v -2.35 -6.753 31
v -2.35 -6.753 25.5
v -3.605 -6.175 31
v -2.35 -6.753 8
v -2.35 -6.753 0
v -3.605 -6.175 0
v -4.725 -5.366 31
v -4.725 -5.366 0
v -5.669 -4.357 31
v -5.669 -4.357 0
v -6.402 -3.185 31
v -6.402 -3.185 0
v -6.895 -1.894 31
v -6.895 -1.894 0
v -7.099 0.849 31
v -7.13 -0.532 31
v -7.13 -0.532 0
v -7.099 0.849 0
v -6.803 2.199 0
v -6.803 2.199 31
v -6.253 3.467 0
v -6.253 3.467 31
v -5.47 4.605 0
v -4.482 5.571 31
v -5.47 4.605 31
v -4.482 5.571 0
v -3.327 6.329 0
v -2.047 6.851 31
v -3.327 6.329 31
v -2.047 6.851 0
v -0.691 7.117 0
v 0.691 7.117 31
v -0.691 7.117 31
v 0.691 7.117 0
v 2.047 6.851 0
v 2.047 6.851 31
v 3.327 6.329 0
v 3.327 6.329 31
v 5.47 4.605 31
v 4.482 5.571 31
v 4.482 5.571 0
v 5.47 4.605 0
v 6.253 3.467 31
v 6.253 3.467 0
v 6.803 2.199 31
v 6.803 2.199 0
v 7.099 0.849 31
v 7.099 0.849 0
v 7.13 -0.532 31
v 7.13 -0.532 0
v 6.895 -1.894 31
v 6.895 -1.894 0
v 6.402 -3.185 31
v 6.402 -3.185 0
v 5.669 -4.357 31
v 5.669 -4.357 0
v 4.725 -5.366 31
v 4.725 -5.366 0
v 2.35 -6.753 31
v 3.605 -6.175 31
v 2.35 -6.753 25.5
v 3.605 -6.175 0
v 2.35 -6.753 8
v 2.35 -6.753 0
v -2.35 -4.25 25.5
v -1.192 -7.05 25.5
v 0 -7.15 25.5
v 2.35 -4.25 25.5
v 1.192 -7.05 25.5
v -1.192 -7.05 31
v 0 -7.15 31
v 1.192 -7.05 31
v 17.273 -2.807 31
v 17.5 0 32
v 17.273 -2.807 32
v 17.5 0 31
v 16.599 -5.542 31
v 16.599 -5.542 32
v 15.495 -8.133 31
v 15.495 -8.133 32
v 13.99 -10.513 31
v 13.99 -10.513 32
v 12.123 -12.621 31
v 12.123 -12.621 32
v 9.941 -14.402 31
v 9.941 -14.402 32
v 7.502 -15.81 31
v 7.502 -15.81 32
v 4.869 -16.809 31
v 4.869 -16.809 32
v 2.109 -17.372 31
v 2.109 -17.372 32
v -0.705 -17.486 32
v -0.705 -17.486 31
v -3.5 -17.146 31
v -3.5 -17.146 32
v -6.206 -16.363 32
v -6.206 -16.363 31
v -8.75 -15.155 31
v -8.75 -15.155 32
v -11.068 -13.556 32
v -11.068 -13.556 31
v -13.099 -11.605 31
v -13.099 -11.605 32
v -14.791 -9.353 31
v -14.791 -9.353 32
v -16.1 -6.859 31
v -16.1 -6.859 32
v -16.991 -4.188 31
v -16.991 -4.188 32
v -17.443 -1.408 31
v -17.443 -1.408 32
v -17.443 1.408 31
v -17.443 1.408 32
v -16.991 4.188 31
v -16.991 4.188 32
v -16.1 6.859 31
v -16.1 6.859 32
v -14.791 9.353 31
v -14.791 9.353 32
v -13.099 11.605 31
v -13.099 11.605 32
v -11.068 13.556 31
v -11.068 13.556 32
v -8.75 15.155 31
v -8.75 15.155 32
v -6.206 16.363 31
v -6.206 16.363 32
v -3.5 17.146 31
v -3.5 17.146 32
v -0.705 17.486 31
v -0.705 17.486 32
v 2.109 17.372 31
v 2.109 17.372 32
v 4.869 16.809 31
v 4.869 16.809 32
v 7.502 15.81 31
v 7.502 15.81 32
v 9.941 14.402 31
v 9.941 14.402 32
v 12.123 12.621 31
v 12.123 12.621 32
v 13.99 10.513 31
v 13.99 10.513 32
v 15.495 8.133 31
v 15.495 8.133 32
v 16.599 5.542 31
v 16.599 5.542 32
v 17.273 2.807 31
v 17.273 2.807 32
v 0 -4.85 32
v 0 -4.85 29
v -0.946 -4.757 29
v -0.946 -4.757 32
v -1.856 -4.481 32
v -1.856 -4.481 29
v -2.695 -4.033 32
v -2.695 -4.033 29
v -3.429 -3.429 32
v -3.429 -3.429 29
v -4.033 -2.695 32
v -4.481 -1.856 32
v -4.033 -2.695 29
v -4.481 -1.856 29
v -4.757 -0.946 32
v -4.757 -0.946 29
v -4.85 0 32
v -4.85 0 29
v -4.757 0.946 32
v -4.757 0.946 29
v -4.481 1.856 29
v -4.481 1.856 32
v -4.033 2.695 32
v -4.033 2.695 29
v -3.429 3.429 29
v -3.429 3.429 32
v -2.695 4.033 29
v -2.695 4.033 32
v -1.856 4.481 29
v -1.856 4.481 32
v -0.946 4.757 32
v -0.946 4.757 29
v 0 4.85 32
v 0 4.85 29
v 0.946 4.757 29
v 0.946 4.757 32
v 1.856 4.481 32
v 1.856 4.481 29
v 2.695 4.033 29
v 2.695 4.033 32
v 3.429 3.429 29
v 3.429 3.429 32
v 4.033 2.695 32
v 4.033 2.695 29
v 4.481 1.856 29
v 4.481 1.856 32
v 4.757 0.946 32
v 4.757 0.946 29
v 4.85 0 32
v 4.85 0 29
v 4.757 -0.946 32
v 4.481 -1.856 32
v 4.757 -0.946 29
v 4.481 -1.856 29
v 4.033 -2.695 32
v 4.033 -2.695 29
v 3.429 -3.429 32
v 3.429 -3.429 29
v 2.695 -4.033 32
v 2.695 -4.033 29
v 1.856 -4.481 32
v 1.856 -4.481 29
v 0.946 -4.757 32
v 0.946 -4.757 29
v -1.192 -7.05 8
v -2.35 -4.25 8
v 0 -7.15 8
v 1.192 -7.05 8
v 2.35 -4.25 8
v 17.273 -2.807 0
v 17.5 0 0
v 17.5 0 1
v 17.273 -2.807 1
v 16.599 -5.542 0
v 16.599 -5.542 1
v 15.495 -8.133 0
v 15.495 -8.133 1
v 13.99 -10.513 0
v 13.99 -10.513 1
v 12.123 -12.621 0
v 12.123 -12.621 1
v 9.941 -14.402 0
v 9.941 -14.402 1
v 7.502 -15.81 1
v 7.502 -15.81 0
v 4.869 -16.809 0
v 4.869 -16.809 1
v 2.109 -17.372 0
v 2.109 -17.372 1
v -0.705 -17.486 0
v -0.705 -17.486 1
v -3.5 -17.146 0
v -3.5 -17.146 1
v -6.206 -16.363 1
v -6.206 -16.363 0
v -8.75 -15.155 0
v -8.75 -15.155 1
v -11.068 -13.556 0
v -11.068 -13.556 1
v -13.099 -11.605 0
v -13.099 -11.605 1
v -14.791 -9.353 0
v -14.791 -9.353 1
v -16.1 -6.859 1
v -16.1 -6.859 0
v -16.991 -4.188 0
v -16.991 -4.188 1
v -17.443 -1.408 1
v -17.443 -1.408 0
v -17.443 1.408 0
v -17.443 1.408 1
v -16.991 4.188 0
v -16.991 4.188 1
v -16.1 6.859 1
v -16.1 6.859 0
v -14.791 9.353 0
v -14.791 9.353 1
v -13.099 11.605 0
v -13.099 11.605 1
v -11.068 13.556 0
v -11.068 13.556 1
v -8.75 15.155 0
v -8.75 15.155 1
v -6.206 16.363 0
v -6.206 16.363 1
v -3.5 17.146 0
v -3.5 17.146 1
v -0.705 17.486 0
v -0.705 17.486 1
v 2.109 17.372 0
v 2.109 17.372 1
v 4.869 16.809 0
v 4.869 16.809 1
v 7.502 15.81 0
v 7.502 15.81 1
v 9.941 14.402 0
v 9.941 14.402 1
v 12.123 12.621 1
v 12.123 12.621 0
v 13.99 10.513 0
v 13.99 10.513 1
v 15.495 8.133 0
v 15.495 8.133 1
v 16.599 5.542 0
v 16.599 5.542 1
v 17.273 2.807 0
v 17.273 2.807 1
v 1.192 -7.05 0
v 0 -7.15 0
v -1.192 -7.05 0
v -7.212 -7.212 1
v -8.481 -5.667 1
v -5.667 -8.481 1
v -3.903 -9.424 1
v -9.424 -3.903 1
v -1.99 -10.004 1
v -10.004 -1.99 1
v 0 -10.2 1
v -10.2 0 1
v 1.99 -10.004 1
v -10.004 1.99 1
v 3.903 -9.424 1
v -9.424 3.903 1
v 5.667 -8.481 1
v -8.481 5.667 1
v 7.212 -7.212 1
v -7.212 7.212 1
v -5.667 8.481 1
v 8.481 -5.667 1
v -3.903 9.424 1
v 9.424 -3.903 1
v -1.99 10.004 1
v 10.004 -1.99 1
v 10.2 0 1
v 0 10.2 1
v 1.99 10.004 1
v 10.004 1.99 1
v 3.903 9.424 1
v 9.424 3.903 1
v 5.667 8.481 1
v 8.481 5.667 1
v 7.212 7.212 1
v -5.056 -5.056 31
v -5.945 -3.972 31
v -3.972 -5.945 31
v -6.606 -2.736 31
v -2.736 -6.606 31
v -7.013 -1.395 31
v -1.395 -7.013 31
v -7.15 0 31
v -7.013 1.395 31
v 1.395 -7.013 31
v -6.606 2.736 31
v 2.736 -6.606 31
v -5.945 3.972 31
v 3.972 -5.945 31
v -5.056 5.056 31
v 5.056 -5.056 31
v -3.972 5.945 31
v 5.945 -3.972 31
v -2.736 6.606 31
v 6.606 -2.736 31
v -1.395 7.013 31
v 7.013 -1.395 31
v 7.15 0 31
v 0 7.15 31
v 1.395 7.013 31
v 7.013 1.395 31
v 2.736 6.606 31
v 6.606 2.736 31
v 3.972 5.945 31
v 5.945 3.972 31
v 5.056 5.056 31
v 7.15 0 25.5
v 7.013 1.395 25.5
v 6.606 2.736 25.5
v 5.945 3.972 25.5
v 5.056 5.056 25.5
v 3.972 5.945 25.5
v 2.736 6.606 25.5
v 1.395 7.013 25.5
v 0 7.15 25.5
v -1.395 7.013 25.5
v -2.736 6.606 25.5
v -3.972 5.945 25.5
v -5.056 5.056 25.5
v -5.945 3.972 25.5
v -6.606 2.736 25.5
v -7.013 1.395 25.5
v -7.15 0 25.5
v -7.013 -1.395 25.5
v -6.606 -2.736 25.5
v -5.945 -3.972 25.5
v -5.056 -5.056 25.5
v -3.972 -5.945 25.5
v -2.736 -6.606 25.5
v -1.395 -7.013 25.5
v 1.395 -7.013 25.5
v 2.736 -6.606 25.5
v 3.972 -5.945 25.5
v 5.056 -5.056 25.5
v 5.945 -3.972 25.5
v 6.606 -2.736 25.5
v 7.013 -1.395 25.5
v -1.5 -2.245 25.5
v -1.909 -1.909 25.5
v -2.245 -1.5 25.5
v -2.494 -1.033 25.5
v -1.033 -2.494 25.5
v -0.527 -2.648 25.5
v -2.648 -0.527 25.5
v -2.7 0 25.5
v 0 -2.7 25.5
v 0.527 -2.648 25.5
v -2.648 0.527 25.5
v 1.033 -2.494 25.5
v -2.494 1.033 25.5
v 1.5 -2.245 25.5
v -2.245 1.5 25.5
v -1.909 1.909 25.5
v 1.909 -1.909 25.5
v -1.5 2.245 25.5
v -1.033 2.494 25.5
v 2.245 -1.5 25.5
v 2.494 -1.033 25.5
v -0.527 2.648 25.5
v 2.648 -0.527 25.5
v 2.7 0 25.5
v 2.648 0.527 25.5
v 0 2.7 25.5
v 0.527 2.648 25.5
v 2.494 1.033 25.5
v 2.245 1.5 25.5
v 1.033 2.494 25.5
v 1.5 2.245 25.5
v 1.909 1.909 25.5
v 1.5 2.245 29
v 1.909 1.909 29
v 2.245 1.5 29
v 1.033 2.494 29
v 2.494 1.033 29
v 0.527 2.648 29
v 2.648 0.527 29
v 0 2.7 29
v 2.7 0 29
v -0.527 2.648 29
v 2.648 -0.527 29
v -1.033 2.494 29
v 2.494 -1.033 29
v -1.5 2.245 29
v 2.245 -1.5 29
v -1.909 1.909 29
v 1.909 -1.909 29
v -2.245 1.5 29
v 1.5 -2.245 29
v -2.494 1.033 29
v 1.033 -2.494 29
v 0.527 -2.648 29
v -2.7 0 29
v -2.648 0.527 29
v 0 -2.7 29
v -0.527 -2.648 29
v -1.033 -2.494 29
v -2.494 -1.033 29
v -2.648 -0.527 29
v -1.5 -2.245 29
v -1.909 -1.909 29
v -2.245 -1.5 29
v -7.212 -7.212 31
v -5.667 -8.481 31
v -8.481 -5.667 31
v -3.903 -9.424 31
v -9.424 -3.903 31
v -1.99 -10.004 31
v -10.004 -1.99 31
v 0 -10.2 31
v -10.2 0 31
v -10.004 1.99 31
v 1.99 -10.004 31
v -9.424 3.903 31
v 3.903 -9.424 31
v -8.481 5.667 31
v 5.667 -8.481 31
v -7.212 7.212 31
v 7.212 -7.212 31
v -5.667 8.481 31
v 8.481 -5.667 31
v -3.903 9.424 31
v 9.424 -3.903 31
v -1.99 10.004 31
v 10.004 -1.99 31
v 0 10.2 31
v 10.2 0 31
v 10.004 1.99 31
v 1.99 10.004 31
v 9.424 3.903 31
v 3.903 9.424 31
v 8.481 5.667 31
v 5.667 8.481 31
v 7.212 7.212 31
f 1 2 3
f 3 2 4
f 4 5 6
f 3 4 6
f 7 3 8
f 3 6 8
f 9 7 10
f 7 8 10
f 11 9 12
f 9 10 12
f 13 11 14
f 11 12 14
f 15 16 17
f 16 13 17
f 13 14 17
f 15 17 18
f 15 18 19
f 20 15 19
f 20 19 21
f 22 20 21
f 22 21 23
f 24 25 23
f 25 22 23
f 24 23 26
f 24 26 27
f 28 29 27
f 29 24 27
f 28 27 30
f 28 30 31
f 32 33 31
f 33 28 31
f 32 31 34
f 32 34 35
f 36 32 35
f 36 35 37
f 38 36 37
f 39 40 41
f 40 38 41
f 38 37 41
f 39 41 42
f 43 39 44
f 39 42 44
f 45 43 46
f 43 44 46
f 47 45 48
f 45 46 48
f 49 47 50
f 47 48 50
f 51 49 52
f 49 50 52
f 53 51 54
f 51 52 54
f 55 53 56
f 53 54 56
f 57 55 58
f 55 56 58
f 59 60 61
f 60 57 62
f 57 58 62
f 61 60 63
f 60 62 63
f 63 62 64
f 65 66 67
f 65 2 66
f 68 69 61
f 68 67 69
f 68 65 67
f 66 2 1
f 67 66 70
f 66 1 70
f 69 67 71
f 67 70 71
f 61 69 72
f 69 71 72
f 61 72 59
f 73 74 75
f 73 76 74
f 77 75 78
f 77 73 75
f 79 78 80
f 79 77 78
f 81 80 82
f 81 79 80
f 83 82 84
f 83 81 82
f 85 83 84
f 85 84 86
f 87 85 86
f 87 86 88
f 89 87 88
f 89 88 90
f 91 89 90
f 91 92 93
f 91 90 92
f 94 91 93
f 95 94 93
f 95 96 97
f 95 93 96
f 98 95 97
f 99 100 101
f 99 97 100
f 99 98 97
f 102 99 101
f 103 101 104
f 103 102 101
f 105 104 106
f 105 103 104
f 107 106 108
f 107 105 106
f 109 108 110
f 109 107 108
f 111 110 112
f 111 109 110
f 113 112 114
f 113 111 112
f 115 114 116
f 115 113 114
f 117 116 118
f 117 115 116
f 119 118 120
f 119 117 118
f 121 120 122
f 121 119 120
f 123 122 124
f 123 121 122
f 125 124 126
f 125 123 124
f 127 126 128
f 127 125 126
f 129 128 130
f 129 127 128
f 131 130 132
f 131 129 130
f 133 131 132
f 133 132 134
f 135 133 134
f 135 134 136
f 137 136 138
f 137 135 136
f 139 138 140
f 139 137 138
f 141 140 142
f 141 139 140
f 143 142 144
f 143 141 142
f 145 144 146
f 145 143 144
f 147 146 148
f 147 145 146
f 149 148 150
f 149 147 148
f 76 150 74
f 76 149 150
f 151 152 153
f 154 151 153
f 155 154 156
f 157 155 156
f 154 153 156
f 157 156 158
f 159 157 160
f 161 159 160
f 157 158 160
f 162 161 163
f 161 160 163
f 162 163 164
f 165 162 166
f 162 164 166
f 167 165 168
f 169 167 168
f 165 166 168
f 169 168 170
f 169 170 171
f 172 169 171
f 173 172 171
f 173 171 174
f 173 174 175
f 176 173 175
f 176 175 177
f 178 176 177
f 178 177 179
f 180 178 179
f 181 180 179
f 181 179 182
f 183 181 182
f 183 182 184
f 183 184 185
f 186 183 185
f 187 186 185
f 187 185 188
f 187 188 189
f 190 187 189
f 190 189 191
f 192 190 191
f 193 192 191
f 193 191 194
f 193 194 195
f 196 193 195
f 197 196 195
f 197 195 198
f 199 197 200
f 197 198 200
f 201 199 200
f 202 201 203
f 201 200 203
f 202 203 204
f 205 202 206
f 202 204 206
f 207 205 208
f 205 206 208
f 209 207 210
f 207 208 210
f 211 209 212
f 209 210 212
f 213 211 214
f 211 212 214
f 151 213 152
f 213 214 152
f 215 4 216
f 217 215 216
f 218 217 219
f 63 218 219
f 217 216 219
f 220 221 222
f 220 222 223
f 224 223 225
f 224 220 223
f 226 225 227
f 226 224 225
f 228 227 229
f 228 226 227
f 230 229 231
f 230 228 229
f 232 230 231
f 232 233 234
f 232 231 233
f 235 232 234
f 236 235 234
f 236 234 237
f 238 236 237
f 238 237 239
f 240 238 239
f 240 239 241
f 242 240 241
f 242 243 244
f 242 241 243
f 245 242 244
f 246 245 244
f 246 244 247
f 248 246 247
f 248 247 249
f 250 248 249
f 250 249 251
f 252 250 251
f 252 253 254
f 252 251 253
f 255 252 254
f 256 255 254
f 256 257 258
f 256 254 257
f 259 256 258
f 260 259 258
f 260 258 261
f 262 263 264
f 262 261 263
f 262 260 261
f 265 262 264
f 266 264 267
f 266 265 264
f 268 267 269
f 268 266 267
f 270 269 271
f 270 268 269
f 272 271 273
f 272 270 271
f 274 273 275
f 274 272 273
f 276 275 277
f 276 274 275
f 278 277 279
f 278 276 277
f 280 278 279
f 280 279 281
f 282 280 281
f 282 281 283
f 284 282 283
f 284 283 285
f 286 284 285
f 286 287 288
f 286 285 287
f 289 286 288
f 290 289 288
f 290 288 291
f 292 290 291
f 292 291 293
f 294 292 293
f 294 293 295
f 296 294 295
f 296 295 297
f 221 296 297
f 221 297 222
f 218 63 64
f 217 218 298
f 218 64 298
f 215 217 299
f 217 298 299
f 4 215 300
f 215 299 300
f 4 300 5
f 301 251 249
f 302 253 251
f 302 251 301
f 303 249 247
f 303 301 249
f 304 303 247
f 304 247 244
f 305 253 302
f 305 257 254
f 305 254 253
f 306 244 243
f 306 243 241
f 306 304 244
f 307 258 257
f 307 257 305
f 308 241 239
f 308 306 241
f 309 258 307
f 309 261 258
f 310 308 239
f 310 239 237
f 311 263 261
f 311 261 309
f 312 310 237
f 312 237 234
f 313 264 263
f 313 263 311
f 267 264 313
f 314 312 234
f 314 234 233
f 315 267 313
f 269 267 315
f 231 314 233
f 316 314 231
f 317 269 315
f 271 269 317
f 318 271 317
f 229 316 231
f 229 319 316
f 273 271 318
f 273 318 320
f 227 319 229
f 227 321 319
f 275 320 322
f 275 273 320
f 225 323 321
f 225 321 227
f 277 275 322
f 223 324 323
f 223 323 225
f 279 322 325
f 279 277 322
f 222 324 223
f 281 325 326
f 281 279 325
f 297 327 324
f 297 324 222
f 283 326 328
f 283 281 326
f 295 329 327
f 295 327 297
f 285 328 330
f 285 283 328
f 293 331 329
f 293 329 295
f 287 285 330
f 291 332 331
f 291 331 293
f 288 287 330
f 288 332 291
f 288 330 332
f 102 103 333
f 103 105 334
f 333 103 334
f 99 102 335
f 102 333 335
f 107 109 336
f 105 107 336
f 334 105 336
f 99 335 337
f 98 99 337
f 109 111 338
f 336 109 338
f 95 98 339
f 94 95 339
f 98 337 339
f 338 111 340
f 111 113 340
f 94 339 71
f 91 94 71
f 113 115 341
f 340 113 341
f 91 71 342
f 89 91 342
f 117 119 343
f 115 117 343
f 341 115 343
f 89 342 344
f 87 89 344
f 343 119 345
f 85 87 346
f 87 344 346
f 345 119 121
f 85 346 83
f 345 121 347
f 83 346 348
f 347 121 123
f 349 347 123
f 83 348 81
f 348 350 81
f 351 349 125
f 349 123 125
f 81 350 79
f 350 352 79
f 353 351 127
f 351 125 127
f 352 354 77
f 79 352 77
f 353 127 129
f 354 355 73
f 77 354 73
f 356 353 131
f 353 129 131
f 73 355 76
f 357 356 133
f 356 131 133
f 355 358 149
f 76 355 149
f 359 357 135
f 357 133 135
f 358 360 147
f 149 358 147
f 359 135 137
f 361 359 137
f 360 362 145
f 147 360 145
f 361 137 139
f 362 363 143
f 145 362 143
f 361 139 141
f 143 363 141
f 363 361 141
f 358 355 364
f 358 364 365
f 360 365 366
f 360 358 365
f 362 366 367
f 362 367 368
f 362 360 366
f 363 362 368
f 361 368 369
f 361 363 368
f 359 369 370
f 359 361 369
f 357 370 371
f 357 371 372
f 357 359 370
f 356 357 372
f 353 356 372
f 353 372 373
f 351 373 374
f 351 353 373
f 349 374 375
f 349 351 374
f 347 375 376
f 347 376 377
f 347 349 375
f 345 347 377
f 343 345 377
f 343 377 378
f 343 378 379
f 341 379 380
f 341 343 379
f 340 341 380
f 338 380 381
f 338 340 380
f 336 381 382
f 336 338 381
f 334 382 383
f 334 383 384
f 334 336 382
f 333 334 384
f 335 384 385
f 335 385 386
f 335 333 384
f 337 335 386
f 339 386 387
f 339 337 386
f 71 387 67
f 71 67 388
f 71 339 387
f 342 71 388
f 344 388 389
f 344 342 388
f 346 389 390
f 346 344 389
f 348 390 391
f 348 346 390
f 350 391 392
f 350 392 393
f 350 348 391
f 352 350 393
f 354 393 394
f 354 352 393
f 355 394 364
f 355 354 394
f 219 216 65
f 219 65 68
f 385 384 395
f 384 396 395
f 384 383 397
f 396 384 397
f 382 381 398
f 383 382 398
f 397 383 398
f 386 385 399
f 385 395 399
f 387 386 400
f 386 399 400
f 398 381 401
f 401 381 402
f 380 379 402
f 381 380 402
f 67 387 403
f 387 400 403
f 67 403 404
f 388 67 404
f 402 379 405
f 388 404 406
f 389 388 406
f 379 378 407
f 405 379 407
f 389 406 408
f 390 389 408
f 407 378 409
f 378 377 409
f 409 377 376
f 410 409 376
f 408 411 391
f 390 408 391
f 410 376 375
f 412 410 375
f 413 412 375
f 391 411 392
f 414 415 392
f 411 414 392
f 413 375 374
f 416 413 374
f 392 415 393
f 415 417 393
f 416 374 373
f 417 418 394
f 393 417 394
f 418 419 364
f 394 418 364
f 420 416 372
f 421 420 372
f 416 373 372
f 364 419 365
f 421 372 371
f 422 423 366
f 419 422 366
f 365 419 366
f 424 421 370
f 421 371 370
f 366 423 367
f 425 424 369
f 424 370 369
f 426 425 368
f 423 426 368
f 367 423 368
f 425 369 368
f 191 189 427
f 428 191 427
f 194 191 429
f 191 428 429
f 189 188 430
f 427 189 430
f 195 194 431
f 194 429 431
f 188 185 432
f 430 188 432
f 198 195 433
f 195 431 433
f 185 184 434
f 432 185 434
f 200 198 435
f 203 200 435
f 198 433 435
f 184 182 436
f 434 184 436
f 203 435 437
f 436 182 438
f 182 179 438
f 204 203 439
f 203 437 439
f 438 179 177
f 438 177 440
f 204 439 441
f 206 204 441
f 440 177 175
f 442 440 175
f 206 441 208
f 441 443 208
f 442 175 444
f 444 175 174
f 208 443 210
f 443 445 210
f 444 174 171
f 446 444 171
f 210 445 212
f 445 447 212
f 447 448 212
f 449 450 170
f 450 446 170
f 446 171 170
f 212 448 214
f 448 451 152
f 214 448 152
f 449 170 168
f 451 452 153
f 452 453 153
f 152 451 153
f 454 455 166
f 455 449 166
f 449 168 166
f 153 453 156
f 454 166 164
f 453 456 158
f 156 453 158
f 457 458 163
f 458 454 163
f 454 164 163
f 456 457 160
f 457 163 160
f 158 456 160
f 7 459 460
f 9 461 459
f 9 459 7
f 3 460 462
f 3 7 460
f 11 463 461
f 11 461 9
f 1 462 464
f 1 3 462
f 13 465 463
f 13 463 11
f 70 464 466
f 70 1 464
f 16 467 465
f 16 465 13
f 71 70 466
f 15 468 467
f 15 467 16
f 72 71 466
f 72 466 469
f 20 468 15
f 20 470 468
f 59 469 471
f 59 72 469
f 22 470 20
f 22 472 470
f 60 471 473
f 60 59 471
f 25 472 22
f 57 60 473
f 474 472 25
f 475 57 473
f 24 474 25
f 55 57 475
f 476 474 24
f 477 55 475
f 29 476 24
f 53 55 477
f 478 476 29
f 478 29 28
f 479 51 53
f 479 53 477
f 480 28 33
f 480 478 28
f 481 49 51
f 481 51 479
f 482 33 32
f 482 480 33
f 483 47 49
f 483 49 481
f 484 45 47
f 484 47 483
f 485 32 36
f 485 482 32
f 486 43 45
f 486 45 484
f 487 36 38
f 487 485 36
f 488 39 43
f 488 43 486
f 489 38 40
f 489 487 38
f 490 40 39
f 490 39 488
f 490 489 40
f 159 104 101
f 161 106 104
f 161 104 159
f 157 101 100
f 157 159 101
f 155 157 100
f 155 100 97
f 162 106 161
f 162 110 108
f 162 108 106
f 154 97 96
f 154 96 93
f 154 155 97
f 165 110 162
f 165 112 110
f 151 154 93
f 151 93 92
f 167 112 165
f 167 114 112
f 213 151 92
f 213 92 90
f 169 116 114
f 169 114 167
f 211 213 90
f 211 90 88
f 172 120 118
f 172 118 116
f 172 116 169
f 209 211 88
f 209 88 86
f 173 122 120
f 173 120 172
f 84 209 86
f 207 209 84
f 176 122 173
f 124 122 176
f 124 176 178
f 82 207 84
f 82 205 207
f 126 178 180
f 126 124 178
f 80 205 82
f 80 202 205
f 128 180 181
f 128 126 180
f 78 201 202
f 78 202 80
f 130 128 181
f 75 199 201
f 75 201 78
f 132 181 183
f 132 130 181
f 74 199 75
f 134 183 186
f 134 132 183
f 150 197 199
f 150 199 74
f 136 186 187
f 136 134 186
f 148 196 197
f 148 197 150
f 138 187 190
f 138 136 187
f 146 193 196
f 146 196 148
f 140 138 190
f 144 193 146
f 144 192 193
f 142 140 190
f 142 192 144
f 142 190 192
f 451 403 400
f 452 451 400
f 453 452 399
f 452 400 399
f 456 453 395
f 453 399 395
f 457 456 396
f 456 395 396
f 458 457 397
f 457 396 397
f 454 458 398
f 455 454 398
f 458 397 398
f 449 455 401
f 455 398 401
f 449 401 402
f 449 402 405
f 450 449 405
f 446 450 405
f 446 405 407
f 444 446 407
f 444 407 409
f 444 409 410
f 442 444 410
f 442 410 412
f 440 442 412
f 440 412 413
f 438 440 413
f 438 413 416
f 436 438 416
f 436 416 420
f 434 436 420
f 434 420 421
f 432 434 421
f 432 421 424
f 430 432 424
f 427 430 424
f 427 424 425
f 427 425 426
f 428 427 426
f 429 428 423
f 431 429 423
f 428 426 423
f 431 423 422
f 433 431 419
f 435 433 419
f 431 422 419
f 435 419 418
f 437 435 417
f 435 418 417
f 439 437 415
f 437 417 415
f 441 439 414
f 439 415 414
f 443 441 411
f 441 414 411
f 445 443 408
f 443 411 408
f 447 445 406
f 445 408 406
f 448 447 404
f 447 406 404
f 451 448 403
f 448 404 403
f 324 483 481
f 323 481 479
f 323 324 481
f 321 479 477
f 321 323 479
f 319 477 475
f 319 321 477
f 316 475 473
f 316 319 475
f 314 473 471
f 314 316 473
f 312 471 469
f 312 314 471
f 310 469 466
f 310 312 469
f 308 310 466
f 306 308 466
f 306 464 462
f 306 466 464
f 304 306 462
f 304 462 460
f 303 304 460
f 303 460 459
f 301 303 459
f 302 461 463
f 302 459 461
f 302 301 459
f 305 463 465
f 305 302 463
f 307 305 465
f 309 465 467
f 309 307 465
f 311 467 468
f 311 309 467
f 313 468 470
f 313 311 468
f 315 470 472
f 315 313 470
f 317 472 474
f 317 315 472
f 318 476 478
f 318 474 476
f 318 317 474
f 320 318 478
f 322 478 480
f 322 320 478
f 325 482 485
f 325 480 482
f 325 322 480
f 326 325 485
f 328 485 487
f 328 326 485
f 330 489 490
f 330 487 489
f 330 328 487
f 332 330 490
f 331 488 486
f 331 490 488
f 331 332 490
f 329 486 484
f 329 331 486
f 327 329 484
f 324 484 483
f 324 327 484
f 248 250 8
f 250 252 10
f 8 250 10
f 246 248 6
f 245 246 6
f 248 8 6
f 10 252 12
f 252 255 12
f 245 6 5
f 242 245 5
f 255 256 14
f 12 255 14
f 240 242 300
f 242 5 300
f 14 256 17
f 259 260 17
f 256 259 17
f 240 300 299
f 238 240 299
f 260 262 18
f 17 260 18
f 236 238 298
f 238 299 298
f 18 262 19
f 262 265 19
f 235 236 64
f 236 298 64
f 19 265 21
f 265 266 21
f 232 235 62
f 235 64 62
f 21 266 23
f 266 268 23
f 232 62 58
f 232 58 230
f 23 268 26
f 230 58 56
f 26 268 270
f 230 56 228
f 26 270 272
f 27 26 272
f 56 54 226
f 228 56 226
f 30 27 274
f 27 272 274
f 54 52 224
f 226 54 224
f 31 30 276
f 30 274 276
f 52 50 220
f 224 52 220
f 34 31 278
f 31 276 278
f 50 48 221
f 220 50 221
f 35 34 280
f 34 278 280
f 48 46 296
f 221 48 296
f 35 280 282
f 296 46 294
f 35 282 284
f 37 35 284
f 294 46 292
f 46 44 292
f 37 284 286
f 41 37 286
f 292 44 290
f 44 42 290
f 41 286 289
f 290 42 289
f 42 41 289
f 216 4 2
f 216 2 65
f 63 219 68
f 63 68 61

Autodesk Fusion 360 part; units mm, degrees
sketch "Sketch1" plane through (0, 0, 0) normal (0, 0, 1) x (1, 0, 0)
  circle A0 centre (0, 0) radius 10.2
  line L0 (2.35, -4.25) -> (2.35, -9.45)
  line L1 (-2.35, -4.25) -> (2.35, -4.25)
  line L2 (-2.35, -4.25) -> (2.35, -9.45) construction
  line L3 (2.35, -9.45) -> (-2.35, -9.45)
  line L4 (2.35, -4.25) -> (-2.35, -9.45) construction
  line L5 (-2.35, -9.45) -> (-2.35, -4.25)
  circle A1 centre (0, 0) radius 7.15
  circle A2 centre (0, 0) radius 17.5
  line L6 (0, 0) -> (0, -12)
  point P0 (0, -6.85)
  dimension "d1" = 20.4
  dimension "d2" = 4.7
  dimension "d3" = 5.2
  dimension "d4" = 14.3
  dimension "d5" = 2.9
  dimension "d10" = 35
extrude "Extrude1" add sketch "Sketch1" along normal blind 31 contours L3 L5 A1 L6 | L0 L3 A1 L6 | A0 | L0 L1 A1 L6 | L1 L5 A1 L6 makes body 1
extrude "Extrude2" add sketch "Sketch1" along normal blind 1 contours A2 bodies 1
extrude "Extrude3" add sketch "Sketch1" along normal blind 1 from surface at 31 separate body contours L3 L5 A1 L6 | L0 L3 A1 L6 | A0 | L0 L1 A1 L6 | L1 L5 A1 L6 | A2 makes body 2
extrude "Extrude4" add sketch "Sketch1" against normal blind 6.5 from surface at 32 separate body contours L0 L1 A1 L6 | L1 L5 A1 L6 | L0 L1 L5 A1 makes body 3
combine "Combine1" operation add target body 2 tool bodies 3
move_face "OffsetFaces1" [suppressed]
sketch "Sketch2" plane through (0, 0, 32) normal (0, 0, 1) x (-1, 0, 0)
  circle A0 centre (0, 0) radius 17.5
  circle A1 centre (0, 0) radius 3
extrude "Extrude5" cut sketch "Sketch1" against normal blind 5.5 from surface at 31 contours L0 L1 A1 L6 | L1 L5 A1 L6 bodies 1
hole "Hole1" at (0, 0, 32) direction (0, 0, -1) diameter 5.4 depth 15 tip angle 118 counterbore diameter 9.7 counterbore depth 3 bodies 1 2
extrude "Extrude6" cut sketch "Sketch1" along normal blind 8 contours L0 L1 A1 L6 | L1 L5 A1 L6 bodies 1
